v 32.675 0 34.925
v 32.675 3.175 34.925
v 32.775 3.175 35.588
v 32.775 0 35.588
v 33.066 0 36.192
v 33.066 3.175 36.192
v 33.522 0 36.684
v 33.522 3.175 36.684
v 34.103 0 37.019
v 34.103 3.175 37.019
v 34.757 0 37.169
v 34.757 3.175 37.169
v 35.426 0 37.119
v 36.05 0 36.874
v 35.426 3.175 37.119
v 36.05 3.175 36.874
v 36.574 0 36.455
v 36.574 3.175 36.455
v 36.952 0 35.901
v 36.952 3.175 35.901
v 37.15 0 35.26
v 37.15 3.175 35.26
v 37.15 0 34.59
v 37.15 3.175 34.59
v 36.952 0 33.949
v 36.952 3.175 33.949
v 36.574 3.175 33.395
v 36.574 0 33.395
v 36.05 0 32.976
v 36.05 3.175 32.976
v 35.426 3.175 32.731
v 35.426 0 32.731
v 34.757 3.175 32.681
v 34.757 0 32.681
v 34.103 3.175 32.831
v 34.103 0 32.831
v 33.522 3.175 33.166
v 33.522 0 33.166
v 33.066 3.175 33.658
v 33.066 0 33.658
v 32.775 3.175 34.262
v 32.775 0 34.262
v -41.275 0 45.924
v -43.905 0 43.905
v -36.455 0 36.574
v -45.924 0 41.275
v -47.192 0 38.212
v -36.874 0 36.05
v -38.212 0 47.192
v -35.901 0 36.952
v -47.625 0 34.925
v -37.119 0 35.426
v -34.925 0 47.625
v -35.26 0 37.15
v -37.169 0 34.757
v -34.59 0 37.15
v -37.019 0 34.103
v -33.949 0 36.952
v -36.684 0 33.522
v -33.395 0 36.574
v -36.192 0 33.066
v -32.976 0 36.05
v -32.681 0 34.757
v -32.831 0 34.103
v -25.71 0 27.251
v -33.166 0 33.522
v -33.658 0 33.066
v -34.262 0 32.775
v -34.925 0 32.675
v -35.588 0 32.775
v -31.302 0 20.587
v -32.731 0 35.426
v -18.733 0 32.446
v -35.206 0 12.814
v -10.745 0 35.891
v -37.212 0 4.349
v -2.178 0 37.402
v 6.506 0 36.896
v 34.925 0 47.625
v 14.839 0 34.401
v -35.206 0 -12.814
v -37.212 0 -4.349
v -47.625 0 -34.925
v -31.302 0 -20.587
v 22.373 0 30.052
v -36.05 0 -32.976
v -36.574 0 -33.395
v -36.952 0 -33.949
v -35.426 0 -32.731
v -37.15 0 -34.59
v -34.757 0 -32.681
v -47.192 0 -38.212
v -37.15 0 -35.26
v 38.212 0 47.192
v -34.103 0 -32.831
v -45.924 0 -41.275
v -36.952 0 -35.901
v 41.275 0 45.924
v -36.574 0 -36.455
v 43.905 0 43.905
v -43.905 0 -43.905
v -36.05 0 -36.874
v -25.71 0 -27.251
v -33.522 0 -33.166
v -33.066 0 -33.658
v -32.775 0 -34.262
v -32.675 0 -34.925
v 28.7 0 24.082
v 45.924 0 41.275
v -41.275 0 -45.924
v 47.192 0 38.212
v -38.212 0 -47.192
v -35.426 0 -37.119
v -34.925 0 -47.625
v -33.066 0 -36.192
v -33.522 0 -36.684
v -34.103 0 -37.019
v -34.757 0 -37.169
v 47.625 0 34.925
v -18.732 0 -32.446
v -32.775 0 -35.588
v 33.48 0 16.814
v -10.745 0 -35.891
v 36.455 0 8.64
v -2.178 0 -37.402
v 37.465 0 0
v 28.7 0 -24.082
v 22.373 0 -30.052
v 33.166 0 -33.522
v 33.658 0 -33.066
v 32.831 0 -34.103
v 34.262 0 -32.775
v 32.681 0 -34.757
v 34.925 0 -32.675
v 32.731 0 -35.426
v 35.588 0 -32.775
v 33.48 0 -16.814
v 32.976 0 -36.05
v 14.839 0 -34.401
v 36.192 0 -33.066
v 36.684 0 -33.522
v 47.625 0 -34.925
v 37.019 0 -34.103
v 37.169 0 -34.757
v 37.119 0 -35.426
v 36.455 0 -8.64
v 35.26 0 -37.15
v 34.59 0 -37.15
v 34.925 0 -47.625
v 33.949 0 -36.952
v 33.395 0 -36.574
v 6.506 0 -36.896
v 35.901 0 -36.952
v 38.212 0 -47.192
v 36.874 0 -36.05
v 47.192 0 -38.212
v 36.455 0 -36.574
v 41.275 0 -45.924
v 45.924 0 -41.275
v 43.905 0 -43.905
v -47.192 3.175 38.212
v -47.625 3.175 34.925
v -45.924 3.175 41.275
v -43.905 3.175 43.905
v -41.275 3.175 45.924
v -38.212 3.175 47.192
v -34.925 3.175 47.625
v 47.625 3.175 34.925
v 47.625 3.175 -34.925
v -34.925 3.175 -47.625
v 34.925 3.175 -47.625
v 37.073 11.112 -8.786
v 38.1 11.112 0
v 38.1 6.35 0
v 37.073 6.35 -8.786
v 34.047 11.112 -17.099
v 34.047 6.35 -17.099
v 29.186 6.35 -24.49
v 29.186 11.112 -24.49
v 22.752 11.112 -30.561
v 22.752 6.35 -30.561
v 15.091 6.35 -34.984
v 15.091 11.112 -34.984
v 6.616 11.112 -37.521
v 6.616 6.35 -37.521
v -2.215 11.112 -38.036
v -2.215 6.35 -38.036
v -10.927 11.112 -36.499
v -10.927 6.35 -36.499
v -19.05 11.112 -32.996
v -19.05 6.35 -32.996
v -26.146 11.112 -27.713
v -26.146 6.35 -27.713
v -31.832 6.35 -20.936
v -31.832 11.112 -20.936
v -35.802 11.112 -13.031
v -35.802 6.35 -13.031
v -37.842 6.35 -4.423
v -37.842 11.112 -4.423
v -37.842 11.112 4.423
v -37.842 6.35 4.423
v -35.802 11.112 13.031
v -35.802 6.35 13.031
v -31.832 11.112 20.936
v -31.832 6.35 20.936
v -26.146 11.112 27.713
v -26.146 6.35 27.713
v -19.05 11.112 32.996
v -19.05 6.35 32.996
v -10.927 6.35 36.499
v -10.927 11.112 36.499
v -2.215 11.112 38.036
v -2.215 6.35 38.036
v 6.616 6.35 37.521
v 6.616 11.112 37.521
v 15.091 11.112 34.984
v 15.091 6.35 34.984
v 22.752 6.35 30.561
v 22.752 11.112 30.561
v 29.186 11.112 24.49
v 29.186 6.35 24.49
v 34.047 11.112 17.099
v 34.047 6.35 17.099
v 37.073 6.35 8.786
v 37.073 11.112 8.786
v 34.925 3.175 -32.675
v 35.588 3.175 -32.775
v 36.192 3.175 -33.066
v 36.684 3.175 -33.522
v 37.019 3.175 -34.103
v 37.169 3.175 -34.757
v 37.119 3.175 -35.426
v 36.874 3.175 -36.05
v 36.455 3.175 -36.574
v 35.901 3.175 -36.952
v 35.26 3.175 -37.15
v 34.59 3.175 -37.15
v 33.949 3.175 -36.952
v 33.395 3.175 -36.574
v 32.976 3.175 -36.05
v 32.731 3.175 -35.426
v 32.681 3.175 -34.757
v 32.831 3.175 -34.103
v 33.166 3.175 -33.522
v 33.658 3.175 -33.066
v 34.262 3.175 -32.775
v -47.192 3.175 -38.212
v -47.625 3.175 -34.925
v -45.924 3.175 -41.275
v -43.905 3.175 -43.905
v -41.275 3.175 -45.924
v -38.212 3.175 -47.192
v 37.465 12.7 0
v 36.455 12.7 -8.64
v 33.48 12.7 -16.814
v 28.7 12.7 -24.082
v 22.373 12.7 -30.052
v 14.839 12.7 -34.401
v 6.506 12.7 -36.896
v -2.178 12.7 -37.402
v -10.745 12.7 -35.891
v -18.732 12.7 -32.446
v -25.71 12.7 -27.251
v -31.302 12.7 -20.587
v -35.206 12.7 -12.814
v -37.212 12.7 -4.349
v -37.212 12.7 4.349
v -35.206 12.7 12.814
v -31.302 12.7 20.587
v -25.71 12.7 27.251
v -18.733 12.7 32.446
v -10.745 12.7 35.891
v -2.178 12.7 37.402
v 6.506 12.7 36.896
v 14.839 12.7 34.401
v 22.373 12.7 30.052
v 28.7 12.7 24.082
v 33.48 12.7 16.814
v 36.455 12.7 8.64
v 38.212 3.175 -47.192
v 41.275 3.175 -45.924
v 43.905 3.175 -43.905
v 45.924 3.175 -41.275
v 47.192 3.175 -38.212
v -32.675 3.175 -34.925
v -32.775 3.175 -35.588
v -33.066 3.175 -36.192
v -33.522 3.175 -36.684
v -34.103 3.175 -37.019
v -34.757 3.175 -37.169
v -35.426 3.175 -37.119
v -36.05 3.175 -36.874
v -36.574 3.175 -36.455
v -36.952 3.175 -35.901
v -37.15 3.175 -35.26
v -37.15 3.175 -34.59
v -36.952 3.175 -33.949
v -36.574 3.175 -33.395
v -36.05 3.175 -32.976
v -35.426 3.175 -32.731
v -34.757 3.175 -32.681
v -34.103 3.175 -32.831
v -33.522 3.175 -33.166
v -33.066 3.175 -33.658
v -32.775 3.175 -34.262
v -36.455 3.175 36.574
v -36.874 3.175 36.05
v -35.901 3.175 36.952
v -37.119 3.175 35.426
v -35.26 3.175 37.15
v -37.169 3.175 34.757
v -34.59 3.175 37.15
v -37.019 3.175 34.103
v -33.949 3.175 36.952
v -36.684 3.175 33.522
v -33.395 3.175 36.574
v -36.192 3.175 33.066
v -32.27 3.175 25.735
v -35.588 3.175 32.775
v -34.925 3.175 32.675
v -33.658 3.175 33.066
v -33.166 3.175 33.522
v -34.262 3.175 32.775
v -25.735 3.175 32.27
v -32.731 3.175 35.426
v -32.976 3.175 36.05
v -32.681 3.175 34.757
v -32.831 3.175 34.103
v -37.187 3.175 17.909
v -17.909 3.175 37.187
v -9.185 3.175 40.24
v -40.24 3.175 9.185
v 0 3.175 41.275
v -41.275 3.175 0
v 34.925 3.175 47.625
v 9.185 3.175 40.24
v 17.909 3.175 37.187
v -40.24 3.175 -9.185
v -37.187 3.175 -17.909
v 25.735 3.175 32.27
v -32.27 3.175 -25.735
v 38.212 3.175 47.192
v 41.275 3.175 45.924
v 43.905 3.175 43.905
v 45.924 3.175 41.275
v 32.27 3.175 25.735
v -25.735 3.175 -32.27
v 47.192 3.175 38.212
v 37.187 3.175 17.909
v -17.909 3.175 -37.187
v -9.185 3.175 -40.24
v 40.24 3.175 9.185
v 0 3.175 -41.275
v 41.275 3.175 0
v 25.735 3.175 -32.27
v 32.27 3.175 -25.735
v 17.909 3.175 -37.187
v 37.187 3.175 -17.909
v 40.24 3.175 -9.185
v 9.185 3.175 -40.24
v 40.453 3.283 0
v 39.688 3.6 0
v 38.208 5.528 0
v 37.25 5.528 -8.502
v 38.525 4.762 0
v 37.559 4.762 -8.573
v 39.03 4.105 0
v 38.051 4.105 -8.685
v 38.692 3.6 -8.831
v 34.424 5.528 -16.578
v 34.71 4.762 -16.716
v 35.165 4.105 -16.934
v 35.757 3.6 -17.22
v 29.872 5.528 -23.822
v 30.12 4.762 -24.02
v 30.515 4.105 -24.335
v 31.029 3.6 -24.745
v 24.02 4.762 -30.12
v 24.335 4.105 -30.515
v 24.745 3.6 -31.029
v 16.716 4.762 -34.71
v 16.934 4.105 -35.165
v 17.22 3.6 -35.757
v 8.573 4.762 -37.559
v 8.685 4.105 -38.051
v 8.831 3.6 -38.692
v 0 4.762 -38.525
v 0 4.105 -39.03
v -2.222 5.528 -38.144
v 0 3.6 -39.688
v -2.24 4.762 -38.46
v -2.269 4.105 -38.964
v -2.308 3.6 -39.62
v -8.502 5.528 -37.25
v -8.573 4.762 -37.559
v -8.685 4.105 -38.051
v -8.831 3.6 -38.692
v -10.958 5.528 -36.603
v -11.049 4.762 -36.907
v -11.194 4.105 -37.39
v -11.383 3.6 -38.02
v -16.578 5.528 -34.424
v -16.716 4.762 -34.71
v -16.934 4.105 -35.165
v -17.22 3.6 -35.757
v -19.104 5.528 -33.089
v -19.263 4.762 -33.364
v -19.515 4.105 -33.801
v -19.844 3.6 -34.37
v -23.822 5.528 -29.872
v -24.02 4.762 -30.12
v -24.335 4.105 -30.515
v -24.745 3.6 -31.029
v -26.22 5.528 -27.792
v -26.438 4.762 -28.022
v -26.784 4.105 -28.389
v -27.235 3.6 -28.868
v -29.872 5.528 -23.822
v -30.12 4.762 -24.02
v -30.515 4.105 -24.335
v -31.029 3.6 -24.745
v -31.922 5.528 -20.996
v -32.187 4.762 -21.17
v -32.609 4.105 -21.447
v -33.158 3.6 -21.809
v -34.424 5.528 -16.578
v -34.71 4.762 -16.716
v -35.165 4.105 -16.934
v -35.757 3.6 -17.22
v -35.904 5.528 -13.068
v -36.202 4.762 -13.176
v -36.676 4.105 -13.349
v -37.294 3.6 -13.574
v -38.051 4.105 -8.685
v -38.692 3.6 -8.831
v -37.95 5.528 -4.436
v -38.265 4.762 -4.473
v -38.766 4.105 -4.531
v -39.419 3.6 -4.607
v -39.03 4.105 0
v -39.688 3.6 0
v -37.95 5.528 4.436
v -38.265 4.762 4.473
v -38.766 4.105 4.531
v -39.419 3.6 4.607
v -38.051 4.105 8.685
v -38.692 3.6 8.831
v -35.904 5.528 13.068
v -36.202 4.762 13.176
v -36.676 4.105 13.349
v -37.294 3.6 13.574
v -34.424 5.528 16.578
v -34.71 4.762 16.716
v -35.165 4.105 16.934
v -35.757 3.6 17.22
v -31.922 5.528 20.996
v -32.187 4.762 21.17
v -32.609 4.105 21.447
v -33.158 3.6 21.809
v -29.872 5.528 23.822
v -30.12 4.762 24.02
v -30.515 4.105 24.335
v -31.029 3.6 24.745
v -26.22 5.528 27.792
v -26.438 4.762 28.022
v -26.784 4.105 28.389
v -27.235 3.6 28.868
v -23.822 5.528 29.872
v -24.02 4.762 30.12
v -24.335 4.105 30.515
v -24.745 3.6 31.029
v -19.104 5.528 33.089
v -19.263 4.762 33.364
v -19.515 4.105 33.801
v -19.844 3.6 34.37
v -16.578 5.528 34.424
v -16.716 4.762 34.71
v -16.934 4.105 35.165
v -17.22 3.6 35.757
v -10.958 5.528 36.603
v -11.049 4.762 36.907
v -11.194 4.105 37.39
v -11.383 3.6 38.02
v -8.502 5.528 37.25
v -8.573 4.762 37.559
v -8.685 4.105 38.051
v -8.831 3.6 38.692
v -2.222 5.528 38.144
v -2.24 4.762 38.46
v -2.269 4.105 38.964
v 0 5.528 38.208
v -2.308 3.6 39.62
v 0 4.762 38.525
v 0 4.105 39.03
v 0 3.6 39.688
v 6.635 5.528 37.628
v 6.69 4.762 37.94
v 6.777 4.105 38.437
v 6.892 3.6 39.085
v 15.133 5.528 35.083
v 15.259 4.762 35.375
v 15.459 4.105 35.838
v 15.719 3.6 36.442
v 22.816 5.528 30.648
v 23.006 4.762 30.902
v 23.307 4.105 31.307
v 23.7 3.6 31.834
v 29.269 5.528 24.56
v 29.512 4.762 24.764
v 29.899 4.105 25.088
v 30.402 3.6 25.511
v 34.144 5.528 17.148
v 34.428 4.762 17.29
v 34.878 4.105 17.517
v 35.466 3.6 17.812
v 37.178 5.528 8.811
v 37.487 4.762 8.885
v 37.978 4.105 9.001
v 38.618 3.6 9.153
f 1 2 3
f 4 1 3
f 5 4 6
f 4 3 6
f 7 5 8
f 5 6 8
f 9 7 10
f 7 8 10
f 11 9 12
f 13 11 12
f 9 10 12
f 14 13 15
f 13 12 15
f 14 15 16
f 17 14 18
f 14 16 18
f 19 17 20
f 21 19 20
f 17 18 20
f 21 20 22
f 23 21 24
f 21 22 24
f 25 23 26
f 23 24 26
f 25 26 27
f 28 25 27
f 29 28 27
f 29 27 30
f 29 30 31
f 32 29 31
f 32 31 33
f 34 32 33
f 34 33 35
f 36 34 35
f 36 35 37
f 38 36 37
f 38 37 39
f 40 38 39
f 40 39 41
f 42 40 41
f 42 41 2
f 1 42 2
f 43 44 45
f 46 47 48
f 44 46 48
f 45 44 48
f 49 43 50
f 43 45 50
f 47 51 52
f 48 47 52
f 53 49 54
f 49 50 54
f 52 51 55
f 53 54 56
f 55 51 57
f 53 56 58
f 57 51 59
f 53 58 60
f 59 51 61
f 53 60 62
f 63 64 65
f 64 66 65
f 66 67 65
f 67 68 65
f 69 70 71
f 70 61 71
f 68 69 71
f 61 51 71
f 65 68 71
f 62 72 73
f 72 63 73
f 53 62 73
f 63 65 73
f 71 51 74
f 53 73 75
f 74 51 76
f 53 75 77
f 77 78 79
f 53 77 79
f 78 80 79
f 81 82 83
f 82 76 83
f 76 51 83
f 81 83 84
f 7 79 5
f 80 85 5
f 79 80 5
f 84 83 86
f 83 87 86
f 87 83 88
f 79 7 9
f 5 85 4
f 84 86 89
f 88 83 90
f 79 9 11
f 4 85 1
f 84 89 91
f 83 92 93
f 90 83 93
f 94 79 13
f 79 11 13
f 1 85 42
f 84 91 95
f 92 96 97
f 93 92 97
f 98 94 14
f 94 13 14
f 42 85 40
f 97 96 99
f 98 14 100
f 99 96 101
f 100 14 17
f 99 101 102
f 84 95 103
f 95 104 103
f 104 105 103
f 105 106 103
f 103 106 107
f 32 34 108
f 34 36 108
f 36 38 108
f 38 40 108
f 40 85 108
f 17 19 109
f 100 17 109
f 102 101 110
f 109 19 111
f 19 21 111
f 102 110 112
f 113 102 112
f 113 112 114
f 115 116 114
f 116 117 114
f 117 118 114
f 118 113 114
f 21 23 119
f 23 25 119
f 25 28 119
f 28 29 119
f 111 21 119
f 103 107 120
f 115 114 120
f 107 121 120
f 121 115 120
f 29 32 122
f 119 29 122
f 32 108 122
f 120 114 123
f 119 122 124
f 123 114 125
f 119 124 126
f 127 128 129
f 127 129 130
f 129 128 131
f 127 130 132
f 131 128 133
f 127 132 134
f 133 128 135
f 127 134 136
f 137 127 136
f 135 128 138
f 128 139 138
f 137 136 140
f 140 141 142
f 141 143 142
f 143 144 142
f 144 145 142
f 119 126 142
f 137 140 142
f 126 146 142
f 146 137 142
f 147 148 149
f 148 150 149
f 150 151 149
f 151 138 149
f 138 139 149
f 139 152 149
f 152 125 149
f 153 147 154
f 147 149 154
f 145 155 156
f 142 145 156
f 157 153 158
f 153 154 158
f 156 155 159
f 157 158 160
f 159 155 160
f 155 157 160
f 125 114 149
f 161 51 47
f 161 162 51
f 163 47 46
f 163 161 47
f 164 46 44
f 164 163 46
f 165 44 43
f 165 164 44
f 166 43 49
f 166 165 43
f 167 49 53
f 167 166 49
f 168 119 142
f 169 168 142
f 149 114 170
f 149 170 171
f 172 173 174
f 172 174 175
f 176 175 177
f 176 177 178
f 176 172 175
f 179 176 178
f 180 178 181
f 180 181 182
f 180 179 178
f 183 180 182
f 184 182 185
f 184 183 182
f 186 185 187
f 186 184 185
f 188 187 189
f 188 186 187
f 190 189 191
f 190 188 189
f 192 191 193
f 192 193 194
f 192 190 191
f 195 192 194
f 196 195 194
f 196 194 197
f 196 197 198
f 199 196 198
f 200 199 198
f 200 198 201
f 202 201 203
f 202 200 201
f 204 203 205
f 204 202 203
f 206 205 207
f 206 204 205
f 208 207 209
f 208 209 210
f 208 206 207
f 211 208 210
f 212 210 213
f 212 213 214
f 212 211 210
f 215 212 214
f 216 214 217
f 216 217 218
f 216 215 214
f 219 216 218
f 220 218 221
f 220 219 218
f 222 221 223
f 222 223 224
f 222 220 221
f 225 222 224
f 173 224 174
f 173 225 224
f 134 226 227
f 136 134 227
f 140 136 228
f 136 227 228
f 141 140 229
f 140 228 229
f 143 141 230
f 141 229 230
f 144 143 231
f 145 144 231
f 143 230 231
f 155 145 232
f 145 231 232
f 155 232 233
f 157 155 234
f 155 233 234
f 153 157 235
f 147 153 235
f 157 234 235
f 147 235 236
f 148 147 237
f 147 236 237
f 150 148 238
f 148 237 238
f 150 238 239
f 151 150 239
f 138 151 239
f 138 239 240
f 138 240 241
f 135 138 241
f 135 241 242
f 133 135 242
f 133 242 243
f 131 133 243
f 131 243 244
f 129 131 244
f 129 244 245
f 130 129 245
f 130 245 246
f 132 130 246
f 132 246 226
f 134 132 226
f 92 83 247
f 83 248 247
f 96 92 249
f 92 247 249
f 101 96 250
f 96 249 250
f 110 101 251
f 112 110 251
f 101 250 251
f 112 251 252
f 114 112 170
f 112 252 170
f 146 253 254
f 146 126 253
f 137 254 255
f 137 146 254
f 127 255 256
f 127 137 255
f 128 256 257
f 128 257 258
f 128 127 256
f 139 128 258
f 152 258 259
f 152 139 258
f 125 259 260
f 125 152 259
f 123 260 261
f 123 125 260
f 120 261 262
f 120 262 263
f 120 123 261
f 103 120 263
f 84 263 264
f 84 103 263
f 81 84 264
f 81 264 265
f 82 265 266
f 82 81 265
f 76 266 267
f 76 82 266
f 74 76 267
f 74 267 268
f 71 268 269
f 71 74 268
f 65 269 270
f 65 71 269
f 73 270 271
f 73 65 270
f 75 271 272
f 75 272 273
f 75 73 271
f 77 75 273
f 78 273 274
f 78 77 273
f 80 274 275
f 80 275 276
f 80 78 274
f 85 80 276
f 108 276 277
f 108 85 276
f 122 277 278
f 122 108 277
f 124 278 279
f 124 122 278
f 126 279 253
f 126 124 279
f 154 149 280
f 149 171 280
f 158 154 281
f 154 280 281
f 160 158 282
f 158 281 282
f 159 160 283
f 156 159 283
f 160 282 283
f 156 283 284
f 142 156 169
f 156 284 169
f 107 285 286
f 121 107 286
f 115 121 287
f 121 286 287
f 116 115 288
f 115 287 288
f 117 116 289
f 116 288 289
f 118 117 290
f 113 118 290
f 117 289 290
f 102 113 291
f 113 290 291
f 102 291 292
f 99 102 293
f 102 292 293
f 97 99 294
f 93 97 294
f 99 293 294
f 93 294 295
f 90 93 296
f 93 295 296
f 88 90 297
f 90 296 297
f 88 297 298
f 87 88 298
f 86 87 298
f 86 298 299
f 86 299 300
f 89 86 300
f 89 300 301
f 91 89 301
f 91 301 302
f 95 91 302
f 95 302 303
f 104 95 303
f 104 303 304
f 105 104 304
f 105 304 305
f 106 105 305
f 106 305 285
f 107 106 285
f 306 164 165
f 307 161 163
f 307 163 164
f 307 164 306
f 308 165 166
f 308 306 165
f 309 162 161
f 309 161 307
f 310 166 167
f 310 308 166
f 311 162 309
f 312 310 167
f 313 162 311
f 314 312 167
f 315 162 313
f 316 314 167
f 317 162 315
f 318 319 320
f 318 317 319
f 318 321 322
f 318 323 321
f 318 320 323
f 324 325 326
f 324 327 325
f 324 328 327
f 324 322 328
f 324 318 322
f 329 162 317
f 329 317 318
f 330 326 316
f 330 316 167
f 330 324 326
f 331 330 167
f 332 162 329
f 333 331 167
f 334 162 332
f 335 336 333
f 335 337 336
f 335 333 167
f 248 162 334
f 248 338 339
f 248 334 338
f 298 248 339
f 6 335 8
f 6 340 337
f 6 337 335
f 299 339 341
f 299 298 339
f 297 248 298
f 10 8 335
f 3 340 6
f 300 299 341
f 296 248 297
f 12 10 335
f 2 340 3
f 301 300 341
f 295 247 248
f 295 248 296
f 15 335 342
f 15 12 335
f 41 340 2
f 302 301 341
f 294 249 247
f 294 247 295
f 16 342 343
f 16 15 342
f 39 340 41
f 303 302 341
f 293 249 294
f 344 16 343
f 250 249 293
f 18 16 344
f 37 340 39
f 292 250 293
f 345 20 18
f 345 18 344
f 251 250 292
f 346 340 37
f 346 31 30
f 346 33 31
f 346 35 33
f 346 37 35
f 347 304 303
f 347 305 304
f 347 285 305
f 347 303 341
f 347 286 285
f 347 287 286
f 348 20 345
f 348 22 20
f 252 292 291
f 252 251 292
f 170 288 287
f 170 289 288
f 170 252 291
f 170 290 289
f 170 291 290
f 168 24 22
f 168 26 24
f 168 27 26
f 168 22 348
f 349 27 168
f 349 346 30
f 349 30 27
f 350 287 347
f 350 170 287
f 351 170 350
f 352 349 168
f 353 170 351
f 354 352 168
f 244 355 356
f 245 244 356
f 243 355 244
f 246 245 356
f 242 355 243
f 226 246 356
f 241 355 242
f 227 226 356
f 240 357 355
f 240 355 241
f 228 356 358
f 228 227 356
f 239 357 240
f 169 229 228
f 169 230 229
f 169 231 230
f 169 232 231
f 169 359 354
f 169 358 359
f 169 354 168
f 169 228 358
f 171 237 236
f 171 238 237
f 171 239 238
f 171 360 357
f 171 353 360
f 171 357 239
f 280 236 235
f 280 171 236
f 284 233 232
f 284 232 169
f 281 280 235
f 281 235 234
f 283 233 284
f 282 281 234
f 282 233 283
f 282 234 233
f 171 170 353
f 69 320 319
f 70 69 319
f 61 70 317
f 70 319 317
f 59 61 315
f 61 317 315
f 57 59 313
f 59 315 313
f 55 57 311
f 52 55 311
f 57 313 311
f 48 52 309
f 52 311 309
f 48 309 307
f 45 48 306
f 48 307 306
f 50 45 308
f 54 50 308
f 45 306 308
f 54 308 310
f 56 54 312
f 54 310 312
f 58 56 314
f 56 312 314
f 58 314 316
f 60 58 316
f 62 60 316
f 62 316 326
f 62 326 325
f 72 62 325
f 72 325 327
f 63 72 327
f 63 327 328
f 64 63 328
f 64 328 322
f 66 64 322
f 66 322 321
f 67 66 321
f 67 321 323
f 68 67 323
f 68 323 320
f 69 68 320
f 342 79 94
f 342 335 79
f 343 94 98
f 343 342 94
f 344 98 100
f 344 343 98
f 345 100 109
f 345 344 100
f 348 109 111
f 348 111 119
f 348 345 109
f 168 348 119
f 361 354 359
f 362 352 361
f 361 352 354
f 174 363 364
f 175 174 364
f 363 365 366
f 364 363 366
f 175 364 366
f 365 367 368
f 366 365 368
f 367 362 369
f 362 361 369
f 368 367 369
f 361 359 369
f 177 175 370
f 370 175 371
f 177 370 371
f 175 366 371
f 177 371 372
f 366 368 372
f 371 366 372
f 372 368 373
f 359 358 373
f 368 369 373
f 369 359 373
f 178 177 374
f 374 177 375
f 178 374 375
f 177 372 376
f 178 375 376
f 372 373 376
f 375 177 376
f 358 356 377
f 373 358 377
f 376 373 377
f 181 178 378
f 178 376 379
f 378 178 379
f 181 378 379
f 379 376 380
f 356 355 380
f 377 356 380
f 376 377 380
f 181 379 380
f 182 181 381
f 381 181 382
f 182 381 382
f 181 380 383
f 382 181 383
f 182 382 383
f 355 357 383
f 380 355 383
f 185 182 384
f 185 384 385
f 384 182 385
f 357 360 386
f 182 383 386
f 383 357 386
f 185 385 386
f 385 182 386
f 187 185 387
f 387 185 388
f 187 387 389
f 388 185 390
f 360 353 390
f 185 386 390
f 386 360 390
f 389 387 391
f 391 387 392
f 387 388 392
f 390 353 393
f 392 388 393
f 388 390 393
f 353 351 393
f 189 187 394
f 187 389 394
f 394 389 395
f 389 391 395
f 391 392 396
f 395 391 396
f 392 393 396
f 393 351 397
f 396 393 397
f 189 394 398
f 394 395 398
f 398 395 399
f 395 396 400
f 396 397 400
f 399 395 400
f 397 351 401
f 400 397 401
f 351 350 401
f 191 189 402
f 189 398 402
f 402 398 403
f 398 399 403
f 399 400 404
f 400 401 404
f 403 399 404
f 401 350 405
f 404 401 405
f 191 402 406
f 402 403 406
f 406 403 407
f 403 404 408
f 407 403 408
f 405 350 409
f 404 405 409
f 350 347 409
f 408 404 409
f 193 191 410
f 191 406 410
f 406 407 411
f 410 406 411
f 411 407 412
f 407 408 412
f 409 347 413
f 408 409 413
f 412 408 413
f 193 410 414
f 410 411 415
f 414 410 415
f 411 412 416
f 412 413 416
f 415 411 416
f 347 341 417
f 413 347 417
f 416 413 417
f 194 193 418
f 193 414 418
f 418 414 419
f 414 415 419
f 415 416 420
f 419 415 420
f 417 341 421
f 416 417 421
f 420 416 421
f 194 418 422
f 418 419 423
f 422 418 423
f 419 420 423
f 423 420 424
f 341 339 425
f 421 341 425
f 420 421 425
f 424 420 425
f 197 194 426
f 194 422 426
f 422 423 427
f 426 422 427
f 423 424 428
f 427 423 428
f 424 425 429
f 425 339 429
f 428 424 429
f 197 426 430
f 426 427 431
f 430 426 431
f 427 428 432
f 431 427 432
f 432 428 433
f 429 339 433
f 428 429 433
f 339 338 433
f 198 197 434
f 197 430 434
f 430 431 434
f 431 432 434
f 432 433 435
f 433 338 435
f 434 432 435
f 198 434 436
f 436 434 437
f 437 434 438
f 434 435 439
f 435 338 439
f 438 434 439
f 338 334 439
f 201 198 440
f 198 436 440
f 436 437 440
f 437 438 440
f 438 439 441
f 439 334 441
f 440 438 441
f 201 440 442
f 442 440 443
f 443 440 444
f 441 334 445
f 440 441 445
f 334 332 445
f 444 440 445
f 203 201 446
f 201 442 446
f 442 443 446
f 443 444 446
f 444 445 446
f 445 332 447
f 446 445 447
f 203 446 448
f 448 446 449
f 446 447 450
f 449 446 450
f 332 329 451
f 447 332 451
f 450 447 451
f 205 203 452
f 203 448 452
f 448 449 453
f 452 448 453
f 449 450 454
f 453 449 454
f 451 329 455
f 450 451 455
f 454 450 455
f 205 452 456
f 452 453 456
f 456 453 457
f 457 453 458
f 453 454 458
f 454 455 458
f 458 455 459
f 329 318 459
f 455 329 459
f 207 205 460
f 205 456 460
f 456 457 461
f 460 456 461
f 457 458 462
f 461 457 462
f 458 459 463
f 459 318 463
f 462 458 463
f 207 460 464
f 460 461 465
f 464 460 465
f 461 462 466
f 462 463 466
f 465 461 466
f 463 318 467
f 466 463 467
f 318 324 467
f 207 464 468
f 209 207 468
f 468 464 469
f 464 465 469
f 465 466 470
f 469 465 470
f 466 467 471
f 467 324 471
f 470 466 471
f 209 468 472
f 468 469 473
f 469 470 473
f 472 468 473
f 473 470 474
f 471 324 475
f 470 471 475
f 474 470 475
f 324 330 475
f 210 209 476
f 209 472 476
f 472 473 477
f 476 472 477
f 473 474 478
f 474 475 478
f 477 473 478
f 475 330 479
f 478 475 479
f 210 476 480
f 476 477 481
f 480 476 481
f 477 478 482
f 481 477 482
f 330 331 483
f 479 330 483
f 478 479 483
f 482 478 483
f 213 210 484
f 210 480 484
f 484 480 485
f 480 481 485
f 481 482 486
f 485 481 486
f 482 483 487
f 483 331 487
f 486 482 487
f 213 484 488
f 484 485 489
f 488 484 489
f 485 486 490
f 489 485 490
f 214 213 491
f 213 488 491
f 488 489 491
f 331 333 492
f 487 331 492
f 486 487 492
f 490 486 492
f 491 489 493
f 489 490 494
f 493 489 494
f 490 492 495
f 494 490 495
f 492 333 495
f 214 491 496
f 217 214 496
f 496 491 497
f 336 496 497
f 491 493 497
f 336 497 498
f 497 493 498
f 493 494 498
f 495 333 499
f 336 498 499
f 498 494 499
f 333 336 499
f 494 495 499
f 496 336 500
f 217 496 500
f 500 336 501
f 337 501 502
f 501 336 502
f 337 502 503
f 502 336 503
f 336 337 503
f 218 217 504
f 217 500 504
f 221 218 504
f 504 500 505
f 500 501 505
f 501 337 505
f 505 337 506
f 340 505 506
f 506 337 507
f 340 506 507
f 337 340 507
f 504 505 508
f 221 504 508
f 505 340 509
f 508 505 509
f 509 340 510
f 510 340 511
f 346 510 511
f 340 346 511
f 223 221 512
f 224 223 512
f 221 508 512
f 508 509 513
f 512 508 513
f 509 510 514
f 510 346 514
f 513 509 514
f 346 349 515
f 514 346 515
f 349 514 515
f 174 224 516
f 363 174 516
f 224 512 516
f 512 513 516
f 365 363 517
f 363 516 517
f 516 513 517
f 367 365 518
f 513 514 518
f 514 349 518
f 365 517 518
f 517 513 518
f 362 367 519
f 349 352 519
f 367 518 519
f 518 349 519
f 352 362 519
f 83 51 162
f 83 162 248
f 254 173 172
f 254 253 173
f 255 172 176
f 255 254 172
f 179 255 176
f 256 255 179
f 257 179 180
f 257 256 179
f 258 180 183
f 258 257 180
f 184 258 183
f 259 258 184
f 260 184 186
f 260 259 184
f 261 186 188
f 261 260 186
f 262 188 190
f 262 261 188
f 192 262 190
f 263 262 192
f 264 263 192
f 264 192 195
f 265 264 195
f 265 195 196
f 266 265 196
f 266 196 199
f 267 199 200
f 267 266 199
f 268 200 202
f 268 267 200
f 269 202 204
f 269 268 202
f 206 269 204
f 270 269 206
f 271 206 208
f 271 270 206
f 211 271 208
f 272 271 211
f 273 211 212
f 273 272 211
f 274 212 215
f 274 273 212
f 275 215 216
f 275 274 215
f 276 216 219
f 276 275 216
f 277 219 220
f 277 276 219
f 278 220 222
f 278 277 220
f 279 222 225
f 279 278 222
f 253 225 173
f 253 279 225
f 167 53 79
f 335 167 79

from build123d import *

# Parameters (mm, degrees)
SKETCH1_W           = 95.25
SKETCH1_H           = 95.25
SKETCH1_R           = 37.465
BOSS_EXTRUDE1_DEPTH = 3.175
SKETCH2_R           = 2.25
CUT_EXTRUDE1_DEPTH  = 4.175
CIRPATTERN1_COUNT   = 4
FILLET1_R           = 12.7
FILLET2_R           = 3.175


with BuildPart() as part:
    # Sketch1 → Boss-Extrude1 (new body)
    with BuildSketch(Plane(origin=(0, 0, 0), x_dir=(1, 0, 0), z_dir=(0, 1, 0))):
        Rectangle(SKETCH1_W, SKETCH1_H)
        Circle(SKETCH1_R, mode=Mode.SUBTRACT)
    extrude(amount=BOSS_EXTRUDE1_DEPTH)

    # Sketch2 → Cut-Extrude1 (cut, through all)
    with BuildSketch(Plane(origin=(0, 3.175, 0), x_dir=(1, 0, 0), z_dir=(0, 1, 0))):
        with Locations((-34.925, 34.925)):
            Circle(SKETCH2_R)
    cut_extrude1 = extrude(amount=-CUT_EXTRUDE1_DEPTH, mode=Mode.SUBTRACT)

    # CirPattern1: Cut-Extrude1 ×4 about axis
    cirpattern1_axis = Axis((0, 0, 0), (0, 1, 0))
    for i in range(1, CIRPATTERN1_COUNT):
        add(cut_extrude1.rotate(cirpattern1_axis, i * 360 / CIRPATTERN1_COUNT), mode=Mode.SUBTRACT)

    # Fillet1
    fillet1_edges = [part.edges().sort_by_distance(p)[0] for p in [
        (-47.625, 1.5875, -47.625),
        (47.625, 1.5875, -47.625),
        (47.625, 1.5875, 47.625),
        (-47.625, 1.5875, 47.625),
    ]]
    fillet(fillet1_edges, radius=FILLET1_R)

    # Sketch4 → Revolve1 (revolve)
    with BuildSketch(Plane.XY):
        Polygon((37.465, 9.525), (37.465, 3.175), (38.1, 3.175), (38.1, 10.3505), (38.1, 11.1125), (37.465, 12.7), align=None)
    revolve(axis=Axis((0, 0, 0), (0, 1, 0)))

    # Fillet2
    fillet2_edges = [part.edges().sort_by_distance(p)[0] for p in [
        (-38.1, 3.175, 0),
    ]]
    fillet(fillet2_edges, radius=FILLET2_R)


solid = part.part
